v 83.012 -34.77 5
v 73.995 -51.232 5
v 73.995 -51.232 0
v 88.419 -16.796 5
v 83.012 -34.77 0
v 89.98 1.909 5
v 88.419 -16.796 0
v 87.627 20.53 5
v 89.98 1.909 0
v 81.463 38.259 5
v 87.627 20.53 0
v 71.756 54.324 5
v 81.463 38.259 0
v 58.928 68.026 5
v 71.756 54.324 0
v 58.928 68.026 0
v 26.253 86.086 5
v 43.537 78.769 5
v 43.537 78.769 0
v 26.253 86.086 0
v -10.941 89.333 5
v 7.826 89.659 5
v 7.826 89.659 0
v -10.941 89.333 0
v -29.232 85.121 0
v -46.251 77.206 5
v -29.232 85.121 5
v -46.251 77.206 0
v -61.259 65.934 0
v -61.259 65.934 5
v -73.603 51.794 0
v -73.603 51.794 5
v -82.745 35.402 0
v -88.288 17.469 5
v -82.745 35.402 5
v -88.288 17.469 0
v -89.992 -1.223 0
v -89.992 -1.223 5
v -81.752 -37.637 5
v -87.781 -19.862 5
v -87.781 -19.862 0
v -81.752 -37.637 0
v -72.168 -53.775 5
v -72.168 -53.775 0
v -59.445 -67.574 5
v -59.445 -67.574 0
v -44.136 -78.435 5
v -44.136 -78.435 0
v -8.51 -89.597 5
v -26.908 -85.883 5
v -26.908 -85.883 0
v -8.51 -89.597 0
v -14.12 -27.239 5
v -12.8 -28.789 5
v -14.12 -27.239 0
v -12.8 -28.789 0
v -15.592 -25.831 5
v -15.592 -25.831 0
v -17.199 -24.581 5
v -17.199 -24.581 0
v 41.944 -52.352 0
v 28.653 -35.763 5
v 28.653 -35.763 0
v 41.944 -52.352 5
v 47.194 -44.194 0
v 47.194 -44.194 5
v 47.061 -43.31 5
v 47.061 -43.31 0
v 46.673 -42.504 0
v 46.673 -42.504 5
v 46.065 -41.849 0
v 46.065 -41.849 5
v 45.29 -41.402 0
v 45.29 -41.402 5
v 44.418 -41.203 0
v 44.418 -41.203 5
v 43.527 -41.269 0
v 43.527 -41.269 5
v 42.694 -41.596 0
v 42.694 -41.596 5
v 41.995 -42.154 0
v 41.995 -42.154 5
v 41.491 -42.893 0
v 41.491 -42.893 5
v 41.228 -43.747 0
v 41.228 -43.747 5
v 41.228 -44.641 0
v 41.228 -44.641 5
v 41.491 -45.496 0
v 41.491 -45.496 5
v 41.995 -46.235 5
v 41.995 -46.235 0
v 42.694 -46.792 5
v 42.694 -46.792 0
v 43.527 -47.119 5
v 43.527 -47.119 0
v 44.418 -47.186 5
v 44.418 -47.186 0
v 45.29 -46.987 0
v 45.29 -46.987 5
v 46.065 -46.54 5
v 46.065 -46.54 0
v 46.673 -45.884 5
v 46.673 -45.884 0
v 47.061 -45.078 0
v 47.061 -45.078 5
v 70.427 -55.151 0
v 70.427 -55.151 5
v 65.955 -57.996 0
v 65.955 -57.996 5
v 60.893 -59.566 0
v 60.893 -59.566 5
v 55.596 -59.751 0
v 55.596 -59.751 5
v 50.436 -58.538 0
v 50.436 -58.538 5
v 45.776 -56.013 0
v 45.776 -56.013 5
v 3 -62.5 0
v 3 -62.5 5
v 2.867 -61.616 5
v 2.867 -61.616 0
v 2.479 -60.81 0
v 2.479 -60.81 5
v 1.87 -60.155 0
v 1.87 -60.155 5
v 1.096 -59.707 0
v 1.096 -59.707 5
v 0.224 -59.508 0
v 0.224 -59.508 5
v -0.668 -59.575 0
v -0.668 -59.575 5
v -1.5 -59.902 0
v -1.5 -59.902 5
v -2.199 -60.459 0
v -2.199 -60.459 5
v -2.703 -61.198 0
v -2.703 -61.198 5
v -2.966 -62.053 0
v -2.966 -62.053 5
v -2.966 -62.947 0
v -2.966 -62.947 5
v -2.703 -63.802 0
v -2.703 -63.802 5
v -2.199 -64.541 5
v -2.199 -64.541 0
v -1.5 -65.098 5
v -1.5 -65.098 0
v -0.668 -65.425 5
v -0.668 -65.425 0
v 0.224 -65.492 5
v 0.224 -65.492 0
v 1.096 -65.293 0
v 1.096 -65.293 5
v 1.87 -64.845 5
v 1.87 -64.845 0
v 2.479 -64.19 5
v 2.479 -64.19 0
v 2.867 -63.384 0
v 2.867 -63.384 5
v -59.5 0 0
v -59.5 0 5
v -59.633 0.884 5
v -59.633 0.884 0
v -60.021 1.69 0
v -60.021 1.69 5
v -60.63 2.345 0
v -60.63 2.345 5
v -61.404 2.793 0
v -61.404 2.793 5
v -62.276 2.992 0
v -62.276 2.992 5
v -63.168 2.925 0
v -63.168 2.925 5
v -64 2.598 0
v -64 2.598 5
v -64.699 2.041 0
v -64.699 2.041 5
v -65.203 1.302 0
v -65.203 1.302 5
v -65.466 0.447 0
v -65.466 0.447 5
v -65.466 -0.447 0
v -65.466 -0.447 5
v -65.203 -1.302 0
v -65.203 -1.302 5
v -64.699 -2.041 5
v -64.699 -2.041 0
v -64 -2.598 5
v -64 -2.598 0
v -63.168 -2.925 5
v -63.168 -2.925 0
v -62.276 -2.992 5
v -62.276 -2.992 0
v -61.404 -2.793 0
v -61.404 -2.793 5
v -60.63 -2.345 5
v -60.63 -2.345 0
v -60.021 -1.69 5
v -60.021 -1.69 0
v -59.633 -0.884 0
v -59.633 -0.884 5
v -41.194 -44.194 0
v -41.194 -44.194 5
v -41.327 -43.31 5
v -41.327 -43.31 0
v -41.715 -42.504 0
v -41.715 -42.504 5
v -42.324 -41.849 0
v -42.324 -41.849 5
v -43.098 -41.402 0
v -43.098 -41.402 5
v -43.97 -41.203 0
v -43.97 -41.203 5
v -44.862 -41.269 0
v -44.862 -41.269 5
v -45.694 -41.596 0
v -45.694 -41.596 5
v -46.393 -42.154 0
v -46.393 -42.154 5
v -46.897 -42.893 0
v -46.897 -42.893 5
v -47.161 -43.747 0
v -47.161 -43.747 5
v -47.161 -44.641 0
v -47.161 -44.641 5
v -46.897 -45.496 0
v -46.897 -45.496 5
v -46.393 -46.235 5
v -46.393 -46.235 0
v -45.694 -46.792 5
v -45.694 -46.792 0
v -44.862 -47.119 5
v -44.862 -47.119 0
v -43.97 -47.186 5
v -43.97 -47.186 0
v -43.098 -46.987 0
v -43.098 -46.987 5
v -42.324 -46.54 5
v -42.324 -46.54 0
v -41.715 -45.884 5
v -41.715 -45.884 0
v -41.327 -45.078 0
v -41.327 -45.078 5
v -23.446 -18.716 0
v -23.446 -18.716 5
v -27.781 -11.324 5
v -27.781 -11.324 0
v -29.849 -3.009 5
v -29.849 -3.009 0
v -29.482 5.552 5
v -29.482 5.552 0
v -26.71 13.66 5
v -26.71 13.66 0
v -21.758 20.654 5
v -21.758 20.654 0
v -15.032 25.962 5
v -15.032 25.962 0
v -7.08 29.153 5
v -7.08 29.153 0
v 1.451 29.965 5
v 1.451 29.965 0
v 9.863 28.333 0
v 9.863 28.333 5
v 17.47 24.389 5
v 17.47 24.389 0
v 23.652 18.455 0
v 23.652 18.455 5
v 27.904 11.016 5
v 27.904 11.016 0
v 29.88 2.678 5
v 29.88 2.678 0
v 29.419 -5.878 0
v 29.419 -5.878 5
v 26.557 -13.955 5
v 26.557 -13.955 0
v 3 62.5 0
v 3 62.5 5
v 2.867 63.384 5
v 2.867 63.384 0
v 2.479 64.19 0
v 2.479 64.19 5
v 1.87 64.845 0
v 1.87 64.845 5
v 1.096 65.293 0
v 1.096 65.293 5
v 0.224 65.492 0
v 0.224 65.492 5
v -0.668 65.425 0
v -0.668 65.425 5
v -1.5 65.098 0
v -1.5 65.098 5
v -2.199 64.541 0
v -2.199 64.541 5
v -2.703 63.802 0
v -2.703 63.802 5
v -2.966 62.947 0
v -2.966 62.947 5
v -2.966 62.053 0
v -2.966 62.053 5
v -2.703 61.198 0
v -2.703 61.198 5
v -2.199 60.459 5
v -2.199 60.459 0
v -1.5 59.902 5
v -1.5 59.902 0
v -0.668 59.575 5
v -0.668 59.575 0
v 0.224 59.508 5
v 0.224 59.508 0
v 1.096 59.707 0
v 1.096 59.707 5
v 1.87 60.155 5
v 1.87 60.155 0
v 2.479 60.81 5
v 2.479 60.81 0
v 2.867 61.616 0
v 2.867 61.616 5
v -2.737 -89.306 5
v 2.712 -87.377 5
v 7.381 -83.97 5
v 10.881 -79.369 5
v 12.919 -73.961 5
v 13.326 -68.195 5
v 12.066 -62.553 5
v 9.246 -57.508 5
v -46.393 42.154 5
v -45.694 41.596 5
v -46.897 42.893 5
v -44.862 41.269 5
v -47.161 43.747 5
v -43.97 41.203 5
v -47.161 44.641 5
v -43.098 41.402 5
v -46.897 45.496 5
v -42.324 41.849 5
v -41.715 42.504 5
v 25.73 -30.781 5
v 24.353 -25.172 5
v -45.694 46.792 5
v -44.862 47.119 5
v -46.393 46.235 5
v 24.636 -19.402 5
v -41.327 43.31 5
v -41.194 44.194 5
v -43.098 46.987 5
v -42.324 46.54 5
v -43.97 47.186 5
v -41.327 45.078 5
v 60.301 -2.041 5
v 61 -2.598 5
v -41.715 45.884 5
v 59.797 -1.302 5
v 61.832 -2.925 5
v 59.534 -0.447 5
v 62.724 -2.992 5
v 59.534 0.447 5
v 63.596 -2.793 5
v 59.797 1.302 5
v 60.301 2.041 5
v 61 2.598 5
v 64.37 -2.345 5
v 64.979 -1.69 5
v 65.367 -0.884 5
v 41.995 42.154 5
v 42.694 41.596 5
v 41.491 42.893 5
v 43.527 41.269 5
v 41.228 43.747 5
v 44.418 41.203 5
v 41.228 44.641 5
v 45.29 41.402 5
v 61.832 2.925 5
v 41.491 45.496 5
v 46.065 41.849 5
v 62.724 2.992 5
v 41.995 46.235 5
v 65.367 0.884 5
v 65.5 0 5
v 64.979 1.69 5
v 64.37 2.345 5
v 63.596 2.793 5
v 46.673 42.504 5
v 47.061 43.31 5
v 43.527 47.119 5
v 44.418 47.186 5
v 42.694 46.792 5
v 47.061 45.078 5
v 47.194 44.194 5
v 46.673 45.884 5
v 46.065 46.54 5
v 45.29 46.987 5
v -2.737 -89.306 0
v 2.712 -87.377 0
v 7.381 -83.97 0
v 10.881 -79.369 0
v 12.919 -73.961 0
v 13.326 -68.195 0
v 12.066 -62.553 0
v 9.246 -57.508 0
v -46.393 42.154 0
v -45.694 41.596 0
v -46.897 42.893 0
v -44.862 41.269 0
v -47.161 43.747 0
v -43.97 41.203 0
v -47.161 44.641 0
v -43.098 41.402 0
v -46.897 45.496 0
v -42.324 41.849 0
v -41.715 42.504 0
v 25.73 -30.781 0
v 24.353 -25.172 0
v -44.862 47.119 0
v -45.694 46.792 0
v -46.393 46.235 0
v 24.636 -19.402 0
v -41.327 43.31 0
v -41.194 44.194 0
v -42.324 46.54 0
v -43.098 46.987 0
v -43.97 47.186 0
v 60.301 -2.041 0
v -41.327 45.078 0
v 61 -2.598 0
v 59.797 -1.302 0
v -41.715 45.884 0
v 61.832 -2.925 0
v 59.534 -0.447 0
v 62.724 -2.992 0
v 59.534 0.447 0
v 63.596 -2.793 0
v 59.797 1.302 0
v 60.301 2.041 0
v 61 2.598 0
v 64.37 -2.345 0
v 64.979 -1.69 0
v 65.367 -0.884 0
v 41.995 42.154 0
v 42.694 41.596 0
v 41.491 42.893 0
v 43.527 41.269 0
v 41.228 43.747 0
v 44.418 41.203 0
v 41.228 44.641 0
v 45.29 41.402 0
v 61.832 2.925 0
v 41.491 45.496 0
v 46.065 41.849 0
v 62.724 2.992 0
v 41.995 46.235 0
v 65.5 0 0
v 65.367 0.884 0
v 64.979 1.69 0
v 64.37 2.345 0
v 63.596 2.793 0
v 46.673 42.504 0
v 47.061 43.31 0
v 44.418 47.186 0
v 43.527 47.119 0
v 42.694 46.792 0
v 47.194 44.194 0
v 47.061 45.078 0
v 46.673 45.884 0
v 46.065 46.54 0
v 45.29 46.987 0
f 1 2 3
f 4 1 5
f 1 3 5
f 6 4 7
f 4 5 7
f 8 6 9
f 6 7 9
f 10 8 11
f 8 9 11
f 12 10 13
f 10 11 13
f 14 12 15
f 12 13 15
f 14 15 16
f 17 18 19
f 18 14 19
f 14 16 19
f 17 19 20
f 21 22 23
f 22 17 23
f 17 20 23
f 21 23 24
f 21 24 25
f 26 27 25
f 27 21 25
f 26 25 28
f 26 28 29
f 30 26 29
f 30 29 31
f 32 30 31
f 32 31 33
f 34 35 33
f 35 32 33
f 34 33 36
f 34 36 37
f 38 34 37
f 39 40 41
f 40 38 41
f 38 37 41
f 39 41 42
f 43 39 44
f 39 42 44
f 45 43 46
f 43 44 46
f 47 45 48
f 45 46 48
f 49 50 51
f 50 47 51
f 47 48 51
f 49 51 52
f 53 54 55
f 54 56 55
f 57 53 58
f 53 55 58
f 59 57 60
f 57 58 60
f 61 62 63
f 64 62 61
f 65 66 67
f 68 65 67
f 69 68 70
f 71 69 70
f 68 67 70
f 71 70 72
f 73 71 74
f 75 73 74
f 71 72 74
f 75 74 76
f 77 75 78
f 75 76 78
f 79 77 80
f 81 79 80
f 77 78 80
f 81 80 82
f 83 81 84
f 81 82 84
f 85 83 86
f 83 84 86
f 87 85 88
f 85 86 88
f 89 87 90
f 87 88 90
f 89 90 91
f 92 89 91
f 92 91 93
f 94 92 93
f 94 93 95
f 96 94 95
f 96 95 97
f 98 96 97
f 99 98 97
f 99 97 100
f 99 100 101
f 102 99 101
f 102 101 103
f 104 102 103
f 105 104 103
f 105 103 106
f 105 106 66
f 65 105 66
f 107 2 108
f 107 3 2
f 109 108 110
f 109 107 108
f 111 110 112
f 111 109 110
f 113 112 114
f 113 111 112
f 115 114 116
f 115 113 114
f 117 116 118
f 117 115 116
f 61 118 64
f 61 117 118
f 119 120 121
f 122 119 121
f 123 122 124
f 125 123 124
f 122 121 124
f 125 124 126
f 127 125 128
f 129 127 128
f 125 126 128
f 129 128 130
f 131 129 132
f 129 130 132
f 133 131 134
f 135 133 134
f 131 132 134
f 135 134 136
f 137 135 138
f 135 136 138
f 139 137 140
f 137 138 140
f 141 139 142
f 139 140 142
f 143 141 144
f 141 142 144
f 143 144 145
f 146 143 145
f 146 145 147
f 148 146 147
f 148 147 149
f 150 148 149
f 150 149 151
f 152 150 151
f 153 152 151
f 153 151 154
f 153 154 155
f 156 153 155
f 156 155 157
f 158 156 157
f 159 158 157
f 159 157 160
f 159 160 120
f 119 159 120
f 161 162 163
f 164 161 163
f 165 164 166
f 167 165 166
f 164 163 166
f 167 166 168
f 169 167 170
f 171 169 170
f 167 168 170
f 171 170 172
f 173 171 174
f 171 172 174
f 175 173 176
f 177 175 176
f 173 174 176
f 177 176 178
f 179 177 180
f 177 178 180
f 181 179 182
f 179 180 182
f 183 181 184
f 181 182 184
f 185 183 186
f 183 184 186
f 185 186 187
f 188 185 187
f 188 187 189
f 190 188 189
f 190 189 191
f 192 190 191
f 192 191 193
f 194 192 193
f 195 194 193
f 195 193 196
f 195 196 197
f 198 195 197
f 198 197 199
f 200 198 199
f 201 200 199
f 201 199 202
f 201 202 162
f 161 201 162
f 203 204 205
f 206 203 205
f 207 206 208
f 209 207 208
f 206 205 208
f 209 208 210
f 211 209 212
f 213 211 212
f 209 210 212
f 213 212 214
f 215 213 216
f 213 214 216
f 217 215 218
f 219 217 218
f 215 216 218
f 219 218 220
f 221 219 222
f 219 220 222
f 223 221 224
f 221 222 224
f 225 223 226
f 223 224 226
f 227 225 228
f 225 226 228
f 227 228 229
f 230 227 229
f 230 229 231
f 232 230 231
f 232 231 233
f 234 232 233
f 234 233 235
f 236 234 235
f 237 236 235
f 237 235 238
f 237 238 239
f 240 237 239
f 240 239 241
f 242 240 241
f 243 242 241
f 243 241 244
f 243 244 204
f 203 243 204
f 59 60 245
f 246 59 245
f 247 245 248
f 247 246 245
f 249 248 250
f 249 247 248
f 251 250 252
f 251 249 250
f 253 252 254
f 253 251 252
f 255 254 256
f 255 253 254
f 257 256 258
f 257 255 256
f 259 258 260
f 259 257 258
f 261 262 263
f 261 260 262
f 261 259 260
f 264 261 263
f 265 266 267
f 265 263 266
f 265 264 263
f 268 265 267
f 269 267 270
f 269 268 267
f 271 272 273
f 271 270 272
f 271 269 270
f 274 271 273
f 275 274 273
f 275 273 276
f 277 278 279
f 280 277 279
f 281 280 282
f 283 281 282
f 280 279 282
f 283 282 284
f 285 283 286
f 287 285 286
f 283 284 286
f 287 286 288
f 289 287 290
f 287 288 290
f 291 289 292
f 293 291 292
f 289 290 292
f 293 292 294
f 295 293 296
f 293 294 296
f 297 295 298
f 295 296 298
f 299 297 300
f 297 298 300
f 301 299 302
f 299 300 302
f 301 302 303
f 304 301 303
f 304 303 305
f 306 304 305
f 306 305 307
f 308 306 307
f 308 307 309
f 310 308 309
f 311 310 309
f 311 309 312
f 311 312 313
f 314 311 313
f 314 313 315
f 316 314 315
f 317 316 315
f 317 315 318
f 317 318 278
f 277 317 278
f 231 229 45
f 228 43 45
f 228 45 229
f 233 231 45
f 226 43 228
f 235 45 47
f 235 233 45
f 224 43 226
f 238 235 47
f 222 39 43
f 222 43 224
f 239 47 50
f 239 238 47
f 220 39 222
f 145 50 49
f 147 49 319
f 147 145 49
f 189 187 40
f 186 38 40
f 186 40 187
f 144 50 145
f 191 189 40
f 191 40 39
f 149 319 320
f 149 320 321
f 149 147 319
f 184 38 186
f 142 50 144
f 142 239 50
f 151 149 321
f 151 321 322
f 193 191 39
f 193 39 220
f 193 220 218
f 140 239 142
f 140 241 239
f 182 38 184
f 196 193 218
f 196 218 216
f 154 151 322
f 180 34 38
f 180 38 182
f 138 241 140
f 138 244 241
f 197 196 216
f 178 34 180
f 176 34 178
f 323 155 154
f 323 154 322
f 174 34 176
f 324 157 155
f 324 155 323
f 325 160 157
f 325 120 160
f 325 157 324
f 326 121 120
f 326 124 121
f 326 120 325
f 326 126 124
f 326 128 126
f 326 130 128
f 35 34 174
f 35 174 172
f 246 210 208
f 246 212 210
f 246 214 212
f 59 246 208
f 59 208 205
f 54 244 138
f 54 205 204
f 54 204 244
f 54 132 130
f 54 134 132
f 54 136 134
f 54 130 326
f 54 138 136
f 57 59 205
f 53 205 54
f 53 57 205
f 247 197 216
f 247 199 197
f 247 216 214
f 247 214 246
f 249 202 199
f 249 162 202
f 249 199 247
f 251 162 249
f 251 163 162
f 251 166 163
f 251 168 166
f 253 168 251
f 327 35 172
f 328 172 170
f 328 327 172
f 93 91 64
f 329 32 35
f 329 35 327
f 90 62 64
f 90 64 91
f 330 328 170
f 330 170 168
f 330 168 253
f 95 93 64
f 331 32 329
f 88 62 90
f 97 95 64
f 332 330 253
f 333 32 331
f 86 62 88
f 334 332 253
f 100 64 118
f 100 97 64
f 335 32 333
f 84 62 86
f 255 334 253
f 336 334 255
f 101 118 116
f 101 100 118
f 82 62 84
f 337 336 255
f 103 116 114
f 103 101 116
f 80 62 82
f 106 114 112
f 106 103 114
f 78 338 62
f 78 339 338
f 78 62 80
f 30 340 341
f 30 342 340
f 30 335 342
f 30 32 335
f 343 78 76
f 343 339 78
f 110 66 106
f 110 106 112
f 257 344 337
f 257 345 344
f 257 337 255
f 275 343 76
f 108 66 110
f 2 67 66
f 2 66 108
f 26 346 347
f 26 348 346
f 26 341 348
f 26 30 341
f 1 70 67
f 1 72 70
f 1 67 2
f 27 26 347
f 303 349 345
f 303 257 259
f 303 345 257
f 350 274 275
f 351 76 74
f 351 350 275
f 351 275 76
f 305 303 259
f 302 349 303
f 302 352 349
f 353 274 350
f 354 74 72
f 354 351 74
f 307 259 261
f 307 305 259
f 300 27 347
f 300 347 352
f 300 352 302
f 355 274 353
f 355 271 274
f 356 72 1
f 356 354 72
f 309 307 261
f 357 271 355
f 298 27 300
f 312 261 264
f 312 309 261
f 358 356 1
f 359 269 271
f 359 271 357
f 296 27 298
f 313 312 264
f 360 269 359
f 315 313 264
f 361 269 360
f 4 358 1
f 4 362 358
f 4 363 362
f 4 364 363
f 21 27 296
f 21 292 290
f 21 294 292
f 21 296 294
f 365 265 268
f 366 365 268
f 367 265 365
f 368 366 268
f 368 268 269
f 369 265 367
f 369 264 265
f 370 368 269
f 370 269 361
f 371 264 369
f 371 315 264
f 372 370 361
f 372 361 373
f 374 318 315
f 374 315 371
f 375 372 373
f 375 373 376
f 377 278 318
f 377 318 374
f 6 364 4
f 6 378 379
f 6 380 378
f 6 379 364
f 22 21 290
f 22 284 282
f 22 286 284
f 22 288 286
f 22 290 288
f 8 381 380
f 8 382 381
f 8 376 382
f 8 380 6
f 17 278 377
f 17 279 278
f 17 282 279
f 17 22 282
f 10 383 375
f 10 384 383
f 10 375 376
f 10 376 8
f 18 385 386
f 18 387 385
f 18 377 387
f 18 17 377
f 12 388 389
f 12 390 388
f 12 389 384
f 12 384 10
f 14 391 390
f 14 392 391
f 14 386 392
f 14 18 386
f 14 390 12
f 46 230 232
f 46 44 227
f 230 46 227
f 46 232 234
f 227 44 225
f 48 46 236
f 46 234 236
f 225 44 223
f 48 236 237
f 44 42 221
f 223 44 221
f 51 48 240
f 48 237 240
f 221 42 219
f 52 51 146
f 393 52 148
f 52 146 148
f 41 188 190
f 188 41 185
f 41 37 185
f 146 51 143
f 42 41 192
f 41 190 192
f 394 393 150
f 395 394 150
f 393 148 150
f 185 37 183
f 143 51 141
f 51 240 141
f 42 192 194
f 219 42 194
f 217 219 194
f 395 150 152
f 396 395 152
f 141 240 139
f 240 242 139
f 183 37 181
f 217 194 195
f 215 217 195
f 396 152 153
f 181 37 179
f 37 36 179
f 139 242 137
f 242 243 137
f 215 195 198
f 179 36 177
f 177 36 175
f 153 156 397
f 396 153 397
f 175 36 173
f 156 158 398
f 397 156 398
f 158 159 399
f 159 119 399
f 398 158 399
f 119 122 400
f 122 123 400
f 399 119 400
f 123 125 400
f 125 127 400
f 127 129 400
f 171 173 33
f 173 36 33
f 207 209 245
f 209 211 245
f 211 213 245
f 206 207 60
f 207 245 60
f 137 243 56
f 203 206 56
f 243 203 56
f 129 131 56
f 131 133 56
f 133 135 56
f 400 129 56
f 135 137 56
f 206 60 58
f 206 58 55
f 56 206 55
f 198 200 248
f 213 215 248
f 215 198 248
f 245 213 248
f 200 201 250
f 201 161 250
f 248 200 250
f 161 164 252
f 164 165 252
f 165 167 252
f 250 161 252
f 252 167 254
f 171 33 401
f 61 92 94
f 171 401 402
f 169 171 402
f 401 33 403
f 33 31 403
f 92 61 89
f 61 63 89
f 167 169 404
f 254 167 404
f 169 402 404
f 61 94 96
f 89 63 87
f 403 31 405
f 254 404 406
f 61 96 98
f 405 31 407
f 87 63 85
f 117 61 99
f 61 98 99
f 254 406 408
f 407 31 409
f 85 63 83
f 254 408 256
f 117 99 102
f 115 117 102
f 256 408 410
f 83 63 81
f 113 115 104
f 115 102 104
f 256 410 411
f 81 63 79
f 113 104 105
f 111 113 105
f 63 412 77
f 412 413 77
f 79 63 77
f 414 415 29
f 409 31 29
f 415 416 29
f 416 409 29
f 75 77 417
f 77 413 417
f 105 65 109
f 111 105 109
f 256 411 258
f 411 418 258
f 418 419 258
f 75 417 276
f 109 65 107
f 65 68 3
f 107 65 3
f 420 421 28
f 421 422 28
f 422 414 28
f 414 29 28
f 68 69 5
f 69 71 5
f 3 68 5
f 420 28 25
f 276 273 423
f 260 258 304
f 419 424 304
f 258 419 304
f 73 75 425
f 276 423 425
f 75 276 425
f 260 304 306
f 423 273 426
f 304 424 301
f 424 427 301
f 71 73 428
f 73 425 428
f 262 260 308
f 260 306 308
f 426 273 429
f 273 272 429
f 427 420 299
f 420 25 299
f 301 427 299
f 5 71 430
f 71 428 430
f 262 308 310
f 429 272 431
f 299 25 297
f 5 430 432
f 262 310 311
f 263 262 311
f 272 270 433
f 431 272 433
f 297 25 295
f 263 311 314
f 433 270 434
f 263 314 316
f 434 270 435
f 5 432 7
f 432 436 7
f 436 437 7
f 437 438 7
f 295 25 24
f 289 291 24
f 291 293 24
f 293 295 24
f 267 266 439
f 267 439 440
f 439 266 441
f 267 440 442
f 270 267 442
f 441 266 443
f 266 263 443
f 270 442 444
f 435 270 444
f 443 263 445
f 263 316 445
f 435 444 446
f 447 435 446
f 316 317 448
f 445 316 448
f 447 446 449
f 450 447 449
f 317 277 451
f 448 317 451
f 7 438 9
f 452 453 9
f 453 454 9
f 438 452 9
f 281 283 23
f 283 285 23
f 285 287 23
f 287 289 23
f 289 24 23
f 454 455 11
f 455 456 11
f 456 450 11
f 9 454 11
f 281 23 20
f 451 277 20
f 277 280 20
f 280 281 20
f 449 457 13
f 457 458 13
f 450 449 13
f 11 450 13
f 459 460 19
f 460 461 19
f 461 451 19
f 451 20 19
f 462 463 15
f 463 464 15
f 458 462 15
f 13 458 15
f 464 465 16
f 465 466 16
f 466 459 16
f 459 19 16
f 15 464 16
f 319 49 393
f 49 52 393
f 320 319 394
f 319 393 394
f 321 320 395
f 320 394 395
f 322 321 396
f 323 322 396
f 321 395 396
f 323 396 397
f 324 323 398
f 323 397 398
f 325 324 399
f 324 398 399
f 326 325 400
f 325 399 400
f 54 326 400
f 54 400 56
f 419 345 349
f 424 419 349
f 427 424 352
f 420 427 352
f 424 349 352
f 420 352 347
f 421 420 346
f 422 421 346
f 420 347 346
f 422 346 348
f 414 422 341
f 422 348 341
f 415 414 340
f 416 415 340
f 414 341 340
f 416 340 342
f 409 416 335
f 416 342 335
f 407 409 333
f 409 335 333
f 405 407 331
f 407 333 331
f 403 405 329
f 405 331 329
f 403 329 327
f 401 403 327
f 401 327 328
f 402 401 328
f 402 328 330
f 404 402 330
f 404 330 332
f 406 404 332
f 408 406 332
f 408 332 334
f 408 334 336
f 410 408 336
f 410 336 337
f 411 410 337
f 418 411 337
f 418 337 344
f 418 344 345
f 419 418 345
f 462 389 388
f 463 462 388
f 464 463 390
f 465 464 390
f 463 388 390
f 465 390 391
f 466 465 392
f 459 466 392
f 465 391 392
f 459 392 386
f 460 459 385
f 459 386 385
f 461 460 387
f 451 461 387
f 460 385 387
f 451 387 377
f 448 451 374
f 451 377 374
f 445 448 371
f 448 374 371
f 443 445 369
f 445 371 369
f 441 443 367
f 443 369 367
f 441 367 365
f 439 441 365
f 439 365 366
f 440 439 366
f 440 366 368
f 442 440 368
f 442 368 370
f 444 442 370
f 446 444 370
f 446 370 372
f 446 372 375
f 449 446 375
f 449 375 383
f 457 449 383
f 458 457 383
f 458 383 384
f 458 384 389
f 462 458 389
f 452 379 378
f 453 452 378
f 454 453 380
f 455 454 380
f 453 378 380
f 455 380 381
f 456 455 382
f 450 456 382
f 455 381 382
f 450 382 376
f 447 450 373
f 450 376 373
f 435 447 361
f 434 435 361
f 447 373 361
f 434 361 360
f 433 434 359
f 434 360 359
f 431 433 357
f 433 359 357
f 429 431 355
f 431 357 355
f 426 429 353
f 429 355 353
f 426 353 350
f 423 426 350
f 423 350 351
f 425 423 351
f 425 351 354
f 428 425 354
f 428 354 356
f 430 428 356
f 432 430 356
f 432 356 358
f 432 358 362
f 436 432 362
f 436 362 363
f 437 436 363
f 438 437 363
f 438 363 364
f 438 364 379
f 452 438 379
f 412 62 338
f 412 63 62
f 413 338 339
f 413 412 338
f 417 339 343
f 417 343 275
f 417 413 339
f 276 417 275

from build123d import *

# Parameters (mm, degrees)
SKETCH1_R           = 90
BOSS_EXTRUDE1_DEPTH = 5
CUT_EXTRUDE1_DEPTH  = 44
SKETCH3_R           = 3
CUT_EXTRUDE2_DEPTH  = 129
FILLET1_R           = 20


with BuildPart() as part:
    # Sketch1 → Boss-Extrude1 (new body)
    with BuildSketch(Plane.XY):
        Circle(SKETCH1_R)
    extrude(amount=BOSS_EXTRUDE1_DEPTH)

    # Sketch2 → Cut-Extrude1 (cut)
    with BuildSketch(Plane.XY.offset(5)):
        with BuildLine():
            Line((69.768328483, -87.081626915), (45.971435375, -105.349299959))
            Line((45.971435375, -105.349299959), (-14.920808105, -26.026322935))
            ThreePointArc((-14.920808105, -26.026322935), (-2.321306127, 29.91005747), (18.757736535, -23.412546211))
            Line((18.757736535, -23.412546211), (69.768328483, -87.081626915))
        make_face()
    extrude(amount=-CUT_EXTRUDE1_DEPTH, mode=Mode.SUBTRACT)

    # Sketch3 → Cut-Extrude2 (cut)
    with BuildSketch(Plane.XY.offset(5)):
        with Locations((62.5, 0)):
            Circle(SKETCH3_R)
        with Locations((44.194173824, -44.194173824)):
            Circle(SKETCH3_R)
        with Locations((0, -62.5)):
            Circle(SKETCH3_R)
        with Locations((-44.194173824, -44.194173824)):
            Circle(SKETCH3_R)
        with Locations((-62.5, 0)):
            Circle(SKETCH3_R)
        with Locations((-44.194173824, 44.194173824)):
            Circle(SKETCH3_R)
        with Locations((0, 62.5)):
            Circle(SKETCH3_R)
        with Locations((44.194173824, 44.194173824)):
            Circle(SKETCH3_R)
    extrude(amount=-CUT_EXTRUDE2_DEPTH, mode=Mode.SUBTRACT)

    # Fillet1
    fillet1_edges = [part.edges().sort_by_distance(p)[0] for p in [
        (-14.920808105, -26.026322935, 2.5),
        (56.273209604, -70.237638634, 2.5),
        (18.757736535, -23.412546211, 2.5),
        (30.18651872, -84.786638615, 2.5),
    ]]
    fillet(fillet1_edges, radius=FILLET1_R)


solid = part.part
